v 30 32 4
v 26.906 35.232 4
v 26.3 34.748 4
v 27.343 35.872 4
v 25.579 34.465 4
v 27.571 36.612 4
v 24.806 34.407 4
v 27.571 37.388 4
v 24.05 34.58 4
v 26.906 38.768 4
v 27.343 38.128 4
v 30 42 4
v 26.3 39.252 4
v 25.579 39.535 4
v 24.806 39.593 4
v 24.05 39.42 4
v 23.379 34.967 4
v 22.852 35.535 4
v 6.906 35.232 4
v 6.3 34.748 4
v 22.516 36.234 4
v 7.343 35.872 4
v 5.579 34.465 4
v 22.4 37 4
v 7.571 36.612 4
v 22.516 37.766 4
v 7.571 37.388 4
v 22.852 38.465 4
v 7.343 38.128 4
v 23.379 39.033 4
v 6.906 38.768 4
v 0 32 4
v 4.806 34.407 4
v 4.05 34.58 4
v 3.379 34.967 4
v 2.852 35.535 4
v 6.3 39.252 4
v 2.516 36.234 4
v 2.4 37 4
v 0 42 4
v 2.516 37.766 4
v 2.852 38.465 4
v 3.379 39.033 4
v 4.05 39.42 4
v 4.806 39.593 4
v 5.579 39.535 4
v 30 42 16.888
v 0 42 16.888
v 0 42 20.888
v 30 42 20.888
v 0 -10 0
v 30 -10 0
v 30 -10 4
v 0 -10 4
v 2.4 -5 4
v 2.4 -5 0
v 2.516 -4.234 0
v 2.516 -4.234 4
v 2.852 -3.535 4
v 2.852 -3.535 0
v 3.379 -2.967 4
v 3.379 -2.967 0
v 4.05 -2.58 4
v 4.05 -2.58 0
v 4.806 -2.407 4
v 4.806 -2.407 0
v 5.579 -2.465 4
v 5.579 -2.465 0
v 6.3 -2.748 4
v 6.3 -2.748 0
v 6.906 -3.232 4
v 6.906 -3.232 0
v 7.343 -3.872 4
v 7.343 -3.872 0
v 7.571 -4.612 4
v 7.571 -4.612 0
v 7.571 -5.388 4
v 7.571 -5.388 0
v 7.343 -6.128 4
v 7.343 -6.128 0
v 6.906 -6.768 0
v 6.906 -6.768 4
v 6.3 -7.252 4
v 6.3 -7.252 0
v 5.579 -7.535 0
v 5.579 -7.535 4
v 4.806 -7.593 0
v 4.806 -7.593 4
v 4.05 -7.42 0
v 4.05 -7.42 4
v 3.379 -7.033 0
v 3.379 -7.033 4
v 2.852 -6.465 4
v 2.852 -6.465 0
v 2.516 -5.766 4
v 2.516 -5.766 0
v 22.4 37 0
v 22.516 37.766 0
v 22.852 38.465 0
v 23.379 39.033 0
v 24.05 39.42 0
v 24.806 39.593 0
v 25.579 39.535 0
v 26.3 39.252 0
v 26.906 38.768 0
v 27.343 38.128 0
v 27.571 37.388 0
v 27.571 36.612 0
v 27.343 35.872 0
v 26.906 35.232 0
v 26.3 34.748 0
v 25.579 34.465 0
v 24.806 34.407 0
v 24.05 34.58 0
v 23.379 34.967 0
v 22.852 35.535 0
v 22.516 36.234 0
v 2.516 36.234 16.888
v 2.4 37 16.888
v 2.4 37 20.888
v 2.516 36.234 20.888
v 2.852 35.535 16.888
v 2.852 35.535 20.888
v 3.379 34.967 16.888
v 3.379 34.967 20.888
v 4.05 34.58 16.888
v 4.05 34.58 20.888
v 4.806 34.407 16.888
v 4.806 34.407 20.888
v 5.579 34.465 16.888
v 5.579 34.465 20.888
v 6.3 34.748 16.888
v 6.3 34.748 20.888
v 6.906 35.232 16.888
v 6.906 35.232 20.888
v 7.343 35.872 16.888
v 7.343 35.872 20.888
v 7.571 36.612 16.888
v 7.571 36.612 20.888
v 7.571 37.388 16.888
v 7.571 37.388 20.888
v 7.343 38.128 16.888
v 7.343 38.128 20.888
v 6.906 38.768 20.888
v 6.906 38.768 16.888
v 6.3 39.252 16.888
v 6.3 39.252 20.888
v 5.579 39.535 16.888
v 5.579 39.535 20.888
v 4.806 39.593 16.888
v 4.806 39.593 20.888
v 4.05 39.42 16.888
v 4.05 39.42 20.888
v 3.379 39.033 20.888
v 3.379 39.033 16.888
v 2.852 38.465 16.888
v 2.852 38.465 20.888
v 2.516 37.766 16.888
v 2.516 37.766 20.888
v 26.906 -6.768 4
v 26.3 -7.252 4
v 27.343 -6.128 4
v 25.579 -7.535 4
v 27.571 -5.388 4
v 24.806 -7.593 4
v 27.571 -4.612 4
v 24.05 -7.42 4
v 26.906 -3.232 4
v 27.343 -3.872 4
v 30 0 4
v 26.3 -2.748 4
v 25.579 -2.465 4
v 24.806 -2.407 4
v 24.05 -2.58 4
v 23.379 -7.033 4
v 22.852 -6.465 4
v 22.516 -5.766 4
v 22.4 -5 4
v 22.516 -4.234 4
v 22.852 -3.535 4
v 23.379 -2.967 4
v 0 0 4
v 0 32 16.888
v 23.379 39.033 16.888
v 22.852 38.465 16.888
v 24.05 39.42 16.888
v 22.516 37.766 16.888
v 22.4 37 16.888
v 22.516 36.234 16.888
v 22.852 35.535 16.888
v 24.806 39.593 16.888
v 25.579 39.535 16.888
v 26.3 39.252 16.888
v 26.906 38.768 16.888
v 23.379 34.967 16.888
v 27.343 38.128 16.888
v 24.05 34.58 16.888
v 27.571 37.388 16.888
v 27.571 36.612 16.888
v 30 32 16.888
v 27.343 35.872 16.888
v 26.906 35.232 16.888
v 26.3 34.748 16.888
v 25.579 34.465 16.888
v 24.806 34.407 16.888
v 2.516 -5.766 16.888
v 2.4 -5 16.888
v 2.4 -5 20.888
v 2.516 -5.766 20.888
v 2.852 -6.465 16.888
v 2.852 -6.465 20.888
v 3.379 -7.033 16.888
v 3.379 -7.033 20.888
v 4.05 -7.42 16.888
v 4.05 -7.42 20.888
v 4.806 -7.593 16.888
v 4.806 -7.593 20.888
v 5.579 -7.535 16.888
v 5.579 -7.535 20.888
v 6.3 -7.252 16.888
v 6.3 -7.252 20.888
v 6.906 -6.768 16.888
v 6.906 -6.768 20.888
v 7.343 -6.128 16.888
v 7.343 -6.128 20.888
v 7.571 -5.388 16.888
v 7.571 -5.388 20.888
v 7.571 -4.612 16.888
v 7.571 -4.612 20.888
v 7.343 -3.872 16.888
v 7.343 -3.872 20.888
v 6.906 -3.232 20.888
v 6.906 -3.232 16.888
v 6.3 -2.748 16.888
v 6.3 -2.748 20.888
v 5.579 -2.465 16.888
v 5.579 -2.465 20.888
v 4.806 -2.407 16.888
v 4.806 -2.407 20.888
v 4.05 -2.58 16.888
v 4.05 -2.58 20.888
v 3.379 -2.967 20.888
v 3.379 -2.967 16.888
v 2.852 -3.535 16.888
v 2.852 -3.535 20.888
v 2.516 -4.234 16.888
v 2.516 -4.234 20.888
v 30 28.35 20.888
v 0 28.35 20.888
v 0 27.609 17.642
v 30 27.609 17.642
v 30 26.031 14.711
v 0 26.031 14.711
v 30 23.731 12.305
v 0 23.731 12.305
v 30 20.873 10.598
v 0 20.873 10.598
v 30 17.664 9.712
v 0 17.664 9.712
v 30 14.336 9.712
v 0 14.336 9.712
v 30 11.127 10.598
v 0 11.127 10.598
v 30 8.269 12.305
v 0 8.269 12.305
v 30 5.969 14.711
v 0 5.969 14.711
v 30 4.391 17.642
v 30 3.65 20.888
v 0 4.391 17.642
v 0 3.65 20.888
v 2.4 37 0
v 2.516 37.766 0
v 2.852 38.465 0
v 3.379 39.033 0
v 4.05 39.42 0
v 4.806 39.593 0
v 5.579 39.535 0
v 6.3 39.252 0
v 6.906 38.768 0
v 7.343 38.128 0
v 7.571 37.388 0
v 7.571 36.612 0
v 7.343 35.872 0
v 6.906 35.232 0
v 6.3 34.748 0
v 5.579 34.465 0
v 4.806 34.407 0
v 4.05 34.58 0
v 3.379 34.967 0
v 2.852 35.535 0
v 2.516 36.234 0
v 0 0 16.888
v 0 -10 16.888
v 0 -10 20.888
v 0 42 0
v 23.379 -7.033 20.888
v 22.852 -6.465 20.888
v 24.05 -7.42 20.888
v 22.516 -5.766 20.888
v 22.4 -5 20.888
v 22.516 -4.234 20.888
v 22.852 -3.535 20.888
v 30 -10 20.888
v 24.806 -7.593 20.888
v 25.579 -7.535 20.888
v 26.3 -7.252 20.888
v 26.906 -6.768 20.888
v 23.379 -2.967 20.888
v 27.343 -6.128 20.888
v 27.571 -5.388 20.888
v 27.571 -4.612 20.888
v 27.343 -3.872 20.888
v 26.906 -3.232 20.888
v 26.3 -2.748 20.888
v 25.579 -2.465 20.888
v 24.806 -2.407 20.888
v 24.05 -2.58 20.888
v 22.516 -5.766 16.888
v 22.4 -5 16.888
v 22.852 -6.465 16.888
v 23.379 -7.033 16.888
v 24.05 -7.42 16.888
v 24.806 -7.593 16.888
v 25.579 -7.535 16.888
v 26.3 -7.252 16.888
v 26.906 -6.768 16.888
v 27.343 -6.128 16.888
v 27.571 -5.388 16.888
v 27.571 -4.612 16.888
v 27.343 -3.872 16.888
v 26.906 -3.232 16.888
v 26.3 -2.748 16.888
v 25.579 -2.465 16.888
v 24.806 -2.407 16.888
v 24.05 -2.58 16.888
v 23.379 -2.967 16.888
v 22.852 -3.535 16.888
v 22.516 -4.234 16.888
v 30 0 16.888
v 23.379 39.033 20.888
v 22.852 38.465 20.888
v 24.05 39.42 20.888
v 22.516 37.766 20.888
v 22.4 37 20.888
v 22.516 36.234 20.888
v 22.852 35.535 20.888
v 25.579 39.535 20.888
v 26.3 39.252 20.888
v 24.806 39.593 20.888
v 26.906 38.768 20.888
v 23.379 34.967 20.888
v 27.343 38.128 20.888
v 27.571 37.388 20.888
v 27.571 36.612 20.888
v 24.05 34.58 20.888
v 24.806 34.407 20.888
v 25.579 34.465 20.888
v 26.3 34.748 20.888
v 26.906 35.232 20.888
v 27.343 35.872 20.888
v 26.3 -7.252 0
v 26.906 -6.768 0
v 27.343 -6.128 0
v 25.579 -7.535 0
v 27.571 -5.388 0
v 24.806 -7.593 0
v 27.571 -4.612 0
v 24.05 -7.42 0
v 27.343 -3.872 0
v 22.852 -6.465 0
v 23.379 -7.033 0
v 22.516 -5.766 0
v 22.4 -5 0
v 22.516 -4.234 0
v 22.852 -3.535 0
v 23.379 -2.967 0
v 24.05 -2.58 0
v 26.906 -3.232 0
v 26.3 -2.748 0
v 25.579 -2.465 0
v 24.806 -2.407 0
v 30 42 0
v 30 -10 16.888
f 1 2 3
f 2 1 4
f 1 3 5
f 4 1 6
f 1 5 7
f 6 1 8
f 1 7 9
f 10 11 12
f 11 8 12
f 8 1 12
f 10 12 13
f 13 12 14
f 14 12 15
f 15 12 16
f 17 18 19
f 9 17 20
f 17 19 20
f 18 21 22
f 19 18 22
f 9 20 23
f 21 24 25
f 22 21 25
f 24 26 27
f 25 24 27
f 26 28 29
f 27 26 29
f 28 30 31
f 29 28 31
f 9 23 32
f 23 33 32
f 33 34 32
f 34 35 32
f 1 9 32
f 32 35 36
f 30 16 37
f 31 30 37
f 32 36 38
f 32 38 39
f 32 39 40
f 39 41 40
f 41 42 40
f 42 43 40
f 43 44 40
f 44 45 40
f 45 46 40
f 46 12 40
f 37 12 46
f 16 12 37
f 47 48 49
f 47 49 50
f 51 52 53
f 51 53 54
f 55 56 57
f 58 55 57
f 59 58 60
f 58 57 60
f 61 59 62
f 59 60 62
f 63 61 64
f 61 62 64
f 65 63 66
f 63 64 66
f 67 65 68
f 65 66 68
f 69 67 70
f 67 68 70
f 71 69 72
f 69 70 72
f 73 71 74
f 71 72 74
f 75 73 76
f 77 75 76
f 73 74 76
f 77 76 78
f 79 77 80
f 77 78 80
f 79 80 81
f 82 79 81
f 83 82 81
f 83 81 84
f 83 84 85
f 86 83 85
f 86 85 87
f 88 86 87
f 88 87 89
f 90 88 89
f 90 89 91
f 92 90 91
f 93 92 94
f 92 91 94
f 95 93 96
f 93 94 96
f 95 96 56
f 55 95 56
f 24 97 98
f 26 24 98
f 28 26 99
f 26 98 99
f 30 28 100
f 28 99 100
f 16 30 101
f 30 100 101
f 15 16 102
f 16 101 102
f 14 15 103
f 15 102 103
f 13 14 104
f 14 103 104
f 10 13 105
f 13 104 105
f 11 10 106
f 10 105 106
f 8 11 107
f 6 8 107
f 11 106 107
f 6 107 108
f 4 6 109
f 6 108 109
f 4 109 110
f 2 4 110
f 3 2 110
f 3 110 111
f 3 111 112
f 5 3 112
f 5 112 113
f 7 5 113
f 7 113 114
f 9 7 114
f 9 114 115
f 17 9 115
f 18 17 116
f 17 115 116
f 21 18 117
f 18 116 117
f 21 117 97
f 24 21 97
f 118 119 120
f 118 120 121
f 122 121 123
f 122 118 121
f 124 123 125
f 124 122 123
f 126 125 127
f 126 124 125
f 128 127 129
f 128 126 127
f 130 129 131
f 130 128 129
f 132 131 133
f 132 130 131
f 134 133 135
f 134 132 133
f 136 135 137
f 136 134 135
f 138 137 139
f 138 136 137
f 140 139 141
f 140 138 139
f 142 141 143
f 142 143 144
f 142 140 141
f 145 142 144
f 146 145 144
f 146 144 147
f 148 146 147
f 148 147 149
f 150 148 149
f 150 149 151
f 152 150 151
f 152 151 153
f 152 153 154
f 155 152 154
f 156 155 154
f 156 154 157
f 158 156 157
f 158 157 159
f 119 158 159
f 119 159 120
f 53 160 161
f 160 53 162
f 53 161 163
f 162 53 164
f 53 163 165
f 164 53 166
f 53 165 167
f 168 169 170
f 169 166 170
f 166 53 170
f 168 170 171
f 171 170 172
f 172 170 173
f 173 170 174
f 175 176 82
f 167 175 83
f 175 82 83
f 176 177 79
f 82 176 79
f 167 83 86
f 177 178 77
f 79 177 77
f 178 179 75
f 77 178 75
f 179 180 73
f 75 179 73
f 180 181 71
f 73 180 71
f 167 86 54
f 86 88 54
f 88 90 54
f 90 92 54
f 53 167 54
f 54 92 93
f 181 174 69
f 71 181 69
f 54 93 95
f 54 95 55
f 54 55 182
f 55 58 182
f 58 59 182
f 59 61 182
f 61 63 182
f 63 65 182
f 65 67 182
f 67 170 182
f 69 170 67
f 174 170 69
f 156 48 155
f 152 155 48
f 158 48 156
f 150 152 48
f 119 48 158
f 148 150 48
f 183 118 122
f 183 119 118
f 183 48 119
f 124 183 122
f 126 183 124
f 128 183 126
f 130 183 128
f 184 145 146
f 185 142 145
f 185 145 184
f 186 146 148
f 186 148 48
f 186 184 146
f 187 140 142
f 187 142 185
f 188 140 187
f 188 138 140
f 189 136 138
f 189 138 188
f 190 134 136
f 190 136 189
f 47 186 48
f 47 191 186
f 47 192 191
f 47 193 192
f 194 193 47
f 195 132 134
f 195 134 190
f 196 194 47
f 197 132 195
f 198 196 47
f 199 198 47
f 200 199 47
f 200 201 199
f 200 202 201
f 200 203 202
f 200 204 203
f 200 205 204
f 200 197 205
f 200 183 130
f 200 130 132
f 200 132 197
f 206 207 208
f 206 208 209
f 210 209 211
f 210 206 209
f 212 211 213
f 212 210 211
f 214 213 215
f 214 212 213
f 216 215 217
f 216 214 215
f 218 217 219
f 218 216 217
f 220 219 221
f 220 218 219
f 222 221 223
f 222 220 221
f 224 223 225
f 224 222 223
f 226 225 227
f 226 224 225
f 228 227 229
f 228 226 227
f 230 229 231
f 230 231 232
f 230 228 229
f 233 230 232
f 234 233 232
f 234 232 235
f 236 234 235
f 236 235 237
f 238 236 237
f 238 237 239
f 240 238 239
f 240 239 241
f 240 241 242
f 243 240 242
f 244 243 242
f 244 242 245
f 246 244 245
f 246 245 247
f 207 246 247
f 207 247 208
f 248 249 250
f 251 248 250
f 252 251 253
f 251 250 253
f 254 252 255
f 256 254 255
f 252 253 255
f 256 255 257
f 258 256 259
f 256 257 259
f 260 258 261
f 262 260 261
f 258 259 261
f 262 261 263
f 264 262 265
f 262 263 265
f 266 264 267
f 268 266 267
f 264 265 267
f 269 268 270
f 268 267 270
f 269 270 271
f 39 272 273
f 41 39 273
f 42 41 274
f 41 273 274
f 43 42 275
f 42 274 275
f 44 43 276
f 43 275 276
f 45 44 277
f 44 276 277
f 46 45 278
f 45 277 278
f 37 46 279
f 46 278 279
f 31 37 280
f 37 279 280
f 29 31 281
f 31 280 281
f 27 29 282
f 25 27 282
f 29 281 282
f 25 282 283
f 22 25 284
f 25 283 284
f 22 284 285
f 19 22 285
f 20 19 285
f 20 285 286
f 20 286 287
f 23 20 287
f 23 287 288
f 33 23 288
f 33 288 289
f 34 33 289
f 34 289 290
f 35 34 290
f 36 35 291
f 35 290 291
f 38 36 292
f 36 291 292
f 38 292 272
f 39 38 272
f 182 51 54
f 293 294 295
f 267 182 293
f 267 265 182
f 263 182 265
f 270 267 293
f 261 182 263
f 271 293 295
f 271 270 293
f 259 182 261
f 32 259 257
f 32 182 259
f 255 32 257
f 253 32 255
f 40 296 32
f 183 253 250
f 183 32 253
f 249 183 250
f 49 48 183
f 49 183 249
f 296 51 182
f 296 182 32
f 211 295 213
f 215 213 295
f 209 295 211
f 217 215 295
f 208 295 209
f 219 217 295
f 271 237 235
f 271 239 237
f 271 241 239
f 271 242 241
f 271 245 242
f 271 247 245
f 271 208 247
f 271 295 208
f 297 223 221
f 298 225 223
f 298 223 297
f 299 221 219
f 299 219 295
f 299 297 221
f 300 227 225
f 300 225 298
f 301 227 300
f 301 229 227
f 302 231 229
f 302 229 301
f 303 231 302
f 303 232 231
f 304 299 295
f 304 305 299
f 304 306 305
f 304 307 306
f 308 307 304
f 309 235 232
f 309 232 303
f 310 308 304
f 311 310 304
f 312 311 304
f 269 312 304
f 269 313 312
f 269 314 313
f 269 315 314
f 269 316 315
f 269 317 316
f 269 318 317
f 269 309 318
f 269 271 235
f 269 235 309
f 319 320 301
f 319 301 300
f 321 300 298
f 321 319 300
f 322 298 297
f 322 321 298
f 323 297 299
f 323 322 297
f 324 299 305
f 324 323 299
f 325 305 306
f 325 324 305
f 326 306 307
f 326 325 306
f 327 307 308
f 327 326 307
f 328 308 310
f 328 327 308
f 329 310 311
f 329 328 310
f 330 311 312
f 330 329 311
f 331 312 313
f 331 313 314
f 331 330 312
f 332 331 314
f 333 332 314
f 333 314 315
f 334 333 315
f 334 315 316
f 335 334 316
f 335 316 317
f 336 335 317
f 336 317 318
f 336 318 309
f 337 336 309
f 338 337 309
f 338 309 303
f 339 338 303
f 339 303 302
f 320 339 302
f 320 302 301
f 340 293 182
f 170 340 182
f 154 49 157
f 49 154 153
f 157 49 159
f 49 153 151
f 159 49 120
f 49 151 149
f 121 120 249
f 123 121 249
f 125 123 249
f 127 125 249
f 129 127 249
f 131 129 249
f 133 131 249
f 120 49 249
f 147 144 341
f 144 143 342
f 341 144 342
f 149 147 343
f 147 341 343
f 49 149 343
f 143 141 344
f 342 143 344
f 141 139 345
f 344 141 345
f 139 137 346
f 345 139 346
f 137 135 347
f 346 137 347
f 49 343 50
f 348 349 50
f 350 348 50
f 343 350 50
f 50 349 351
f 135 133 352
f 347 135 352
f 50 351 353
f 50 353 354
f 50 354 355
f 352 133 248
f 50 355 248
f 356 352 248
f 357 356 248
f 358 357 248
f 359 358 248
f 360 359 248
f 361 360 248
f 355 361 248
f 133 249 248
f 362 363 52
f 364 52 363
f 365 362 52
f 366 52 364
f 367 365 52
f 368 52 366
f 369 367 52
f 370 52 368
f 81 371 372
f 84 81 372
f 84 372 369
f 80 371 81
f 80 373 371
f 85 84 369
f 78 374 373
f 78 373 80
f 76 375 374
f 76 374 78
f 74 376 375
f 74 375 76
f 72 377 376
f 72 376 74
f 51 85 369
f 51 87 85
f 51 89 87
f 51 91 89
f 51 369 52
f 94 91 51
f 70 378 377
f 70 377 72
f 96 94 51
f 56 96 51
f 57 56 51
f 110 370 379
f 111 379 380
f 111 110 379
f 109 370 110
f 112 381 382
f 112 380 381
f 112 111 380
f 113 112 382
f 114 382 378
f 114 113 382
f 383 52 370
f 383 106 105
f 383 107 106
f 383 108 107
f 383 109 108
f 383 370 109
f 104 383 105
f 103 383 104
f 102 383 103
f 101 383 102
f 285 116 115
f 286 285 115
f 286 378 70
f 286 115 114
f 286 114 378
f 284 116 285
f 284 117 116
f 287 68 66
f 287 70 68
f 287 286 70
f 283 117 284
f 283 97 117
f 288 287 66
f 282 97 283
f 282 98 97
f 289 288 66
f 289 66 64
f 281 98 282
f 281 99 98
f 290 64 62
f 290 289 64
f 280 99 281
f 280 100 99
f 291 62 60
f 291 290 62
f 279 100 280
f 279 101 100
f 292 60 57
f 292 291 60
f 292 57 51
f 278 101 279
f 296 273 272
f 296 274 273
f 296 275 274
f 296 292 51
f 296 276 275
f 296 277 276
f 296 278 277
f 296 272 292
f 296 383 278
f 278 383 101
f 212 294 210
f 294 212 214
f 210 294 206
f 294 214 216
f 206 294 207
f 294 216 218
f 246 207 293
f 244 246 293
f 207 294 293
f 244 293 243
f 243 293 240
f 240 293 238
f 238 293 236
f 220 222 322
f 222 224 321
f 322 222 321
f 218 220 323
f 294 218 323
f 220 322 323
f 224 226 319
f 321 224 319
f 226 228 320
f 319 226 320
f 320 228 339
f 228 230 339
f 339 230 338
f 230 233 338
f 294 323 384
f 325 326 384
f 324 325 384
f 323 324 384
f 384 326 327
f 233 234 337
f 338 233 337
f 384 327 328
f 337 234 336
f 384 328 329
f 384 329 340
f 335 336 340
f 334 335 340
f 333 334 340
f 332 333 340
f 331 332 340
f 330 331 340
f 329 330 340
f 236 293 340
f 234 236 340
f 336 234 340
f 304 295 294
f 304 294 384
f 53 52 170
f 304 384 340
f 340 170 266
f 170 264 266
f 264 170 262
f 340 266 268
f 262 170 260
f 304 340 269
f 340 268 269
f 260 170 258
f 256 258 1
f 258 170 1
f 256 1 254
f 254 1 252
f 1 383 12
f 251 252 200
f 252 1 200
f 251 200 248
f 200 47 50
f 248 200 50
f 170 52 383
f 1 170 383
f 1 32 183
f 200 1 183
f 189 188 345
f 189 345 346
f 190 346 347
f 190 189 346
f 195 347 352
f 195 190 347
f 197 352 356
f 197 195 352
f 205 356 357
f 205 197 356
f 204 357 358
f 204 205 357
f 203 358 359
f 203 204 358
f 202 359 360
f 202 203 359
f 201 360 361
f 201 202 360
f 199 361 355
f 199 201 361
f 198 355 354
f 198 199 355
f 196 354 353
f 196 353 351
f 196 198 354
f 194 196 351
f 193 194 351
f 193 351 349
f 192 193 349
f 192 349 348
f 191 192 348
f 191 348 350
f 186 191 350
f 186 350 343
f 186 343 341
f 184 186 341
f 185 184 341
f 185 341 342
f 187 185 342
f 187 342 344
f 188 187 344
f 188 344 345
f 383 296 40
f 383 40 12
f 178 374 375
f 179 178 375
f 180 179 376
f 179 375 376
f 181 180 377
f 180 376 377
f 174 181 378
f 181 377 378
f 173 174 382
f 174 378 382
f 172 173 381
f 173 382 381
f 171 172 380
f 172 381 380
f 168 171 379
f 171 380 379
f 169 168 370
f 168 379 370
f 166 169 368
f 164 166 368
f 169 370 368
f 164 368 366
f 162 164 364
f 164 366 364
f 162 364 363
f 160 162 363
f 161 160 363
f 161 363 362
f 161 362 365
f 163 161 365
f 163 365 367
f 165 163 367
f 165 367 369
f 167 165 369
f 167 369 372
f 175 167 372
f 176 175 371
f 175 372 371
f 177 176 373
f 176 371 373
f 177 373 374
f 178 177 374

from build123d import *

# Parameters (mm, degrees)
SKETCH_1_W          = 30
SKETCH_1_H          = 32
EXTRUDE_1_DEPTH     = 7
EXTRUDE_2_DEPTH     = 30
SKETCH_3_R          = 2.6
EXTRUDE_3_DEPTH     = 4
SKETCH_4_W          = 30
SKETCH_4_H          = 4
EXTRUDE_5_DEPTH     = 10
SKETCH_5_W          = 30
SKETCH_5_H          = 4
EXTRUDE_6_DEPTH     = 10
CUT_EXTRUDE_START   = -10
SKETCH_6_R          = 2.6
CUT_EXTRUDE_1_DEPTH = 10


with BuildPart() as part:
    # Эскиз1 → Бобышка-Вытянуть1 (new body)
    with BuildSketch(Plane.XY):
        with Locations((15, 16)):
            Rectangle(SKETCH_1_W, SKETCH_1_H)
    extrude(amount=EXTRUDE_1_DEPTH)

    # Эскиз2 → Бобышка-Вытянуть2 (add)
    with BuildSketch(Plane.ZY):
        with BuildLine():
            Line((7, 32), (20.887570227, 32))
            Line((20.887570227, 32), (20.887570227, 28.35))
            ThreePointArc((20.887570227, 28.35), (9.6, 16), (20.887570227, 3.65))
            Line((20.887570227, 3.65), (20.887570227, 0))
            Line((20.887570227, 0), (7, 0))
            Line((7, 0), (7, 32))
        make_face()
    extrude(amount=-EXTRUDE_2_DEPTH)

    # Эскиз3 → Бобышка-Вытянуть3 (add)
    with BuildSketch(Plane(origin=(0, 0, 0), x_dir=(-1, 0, 0), z_dir=(0, 0, -1))):
        Polygon((-30, 16), (-30, -10), (0, -10), (0, 42), (-30, 42), align=None)
        with Locations((-25, 37)):
            Circle(SKETCH_3_R, mode=Mode.SUBTRACT)
        with Locations((-5, 37)):
            Circle(SKETCH_3_R, mode=Mode.SUBTRACT)
        with Locations((-5, -5)):
            Circle(SKETCH_3_R, mode=Mode.SUBTRACT)
        with Locations((-25, -5)):
            Circle(SKETCH_3_R, mode=Mode.SUBTRACT)
    extrude(amount=-EXTRUDE_3_DEPTH)

    # Эскиз4 → Бобышка-Вытянуть5 (add)
    with BuildSketch(Plane(origin=(0, 32, 0), x_dir=(1, 0, 0), z_dir=(0, 1, 0))):
        with Locations((15, -18.887570227)):
            Rectangle(SKETCH_4_W, SKETCH_4_H)
    extrude(amount=EXTRUDE_5_DEPTH)

    # Эскиз5 → Бобышка-Вытянуть6 (add)
    with BuildSketch(Plane.XZ):
        with Locations((15, 18.887570227)):
            Rectangle(SKETCH_5_W, SKETCH_5_H)
    extrude(amount=EXTRUDE_6_DEPTH)

    # Эскиз6 → Вырез-Вытянуть1 (cut)
    with BuildSketch(Plane.XY.offset(20.887570227).offset(CUT_EXTRUDE_START)):
        with Locations(Location((5, 37, 0), (0, 0, 180))):
            Circle(SKETCH_6_R)
        with Locations(Location((25, 37, 0), (0, 0, 180))):
            Circle(SKETCH_6_R)
        with Locations(Location((25, -5, 0), (0, 0, 180))):
            Circle(SKETCH_6_R)
        with Locations(Location((5, -5, 0), (0, 0, 180))):
            Circle(SKETCH_6_R)
    extrude(amount=CUT_EXTRUDE_1_DEPTH, mode=Mode.SUBTRACT)


solid = part.part
